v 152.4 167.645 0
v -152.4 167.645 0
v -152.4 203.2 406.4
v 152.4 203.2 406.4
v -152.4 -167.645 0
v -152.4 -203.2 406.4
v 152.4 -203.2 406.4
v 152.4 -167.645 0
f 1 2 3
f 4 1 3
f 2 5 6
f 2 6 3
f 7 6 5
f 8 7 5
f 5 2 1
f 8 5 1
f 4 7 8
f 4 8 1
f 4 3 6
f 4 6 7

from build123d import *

# Parameters (mm, degrees)
F0_W     = 304.8
F0_H     = 406.4
F1_DEPTH = 406.4
F3_DEPTH = 609.6
F4_DEPTH = 609.6


with BuildPart() as f1:
    # F0 (on Top) → F1 (new body)
    with BuildSketch(Plane.XY):
        Rectangle(F0_W, F0_H)
    extrude(amount=F1_DEPTH)

    # F2 (on face) → F3 (cut)
    with BuildSketch(Plane(origin=(-152.4, 0, 0), x_dir=(0, -1, 0), z_dir=(-1, 0, 0))):
        Polygon((-167.644607, 0), (-203.2, 406.4), (-203.2, 0), align=None)
    extrude(amount=-F3_DEPTH, mode=Mode.SUBTRACT)

    # F2 (on face) → F4 (cut)
    with BuildSketch(Plane(origin=(-152.4, 0, 0), x_dir=(0, -1, 0), z_dir=(-1, 0, 0))):
        Polygon((203.2, 0), (203.2, 406.4), (167.644607, 0), align=None)
    extrude(amount=-F4_DEPTH, mode=Mode.SUBTRACT)


solid = f1.part
